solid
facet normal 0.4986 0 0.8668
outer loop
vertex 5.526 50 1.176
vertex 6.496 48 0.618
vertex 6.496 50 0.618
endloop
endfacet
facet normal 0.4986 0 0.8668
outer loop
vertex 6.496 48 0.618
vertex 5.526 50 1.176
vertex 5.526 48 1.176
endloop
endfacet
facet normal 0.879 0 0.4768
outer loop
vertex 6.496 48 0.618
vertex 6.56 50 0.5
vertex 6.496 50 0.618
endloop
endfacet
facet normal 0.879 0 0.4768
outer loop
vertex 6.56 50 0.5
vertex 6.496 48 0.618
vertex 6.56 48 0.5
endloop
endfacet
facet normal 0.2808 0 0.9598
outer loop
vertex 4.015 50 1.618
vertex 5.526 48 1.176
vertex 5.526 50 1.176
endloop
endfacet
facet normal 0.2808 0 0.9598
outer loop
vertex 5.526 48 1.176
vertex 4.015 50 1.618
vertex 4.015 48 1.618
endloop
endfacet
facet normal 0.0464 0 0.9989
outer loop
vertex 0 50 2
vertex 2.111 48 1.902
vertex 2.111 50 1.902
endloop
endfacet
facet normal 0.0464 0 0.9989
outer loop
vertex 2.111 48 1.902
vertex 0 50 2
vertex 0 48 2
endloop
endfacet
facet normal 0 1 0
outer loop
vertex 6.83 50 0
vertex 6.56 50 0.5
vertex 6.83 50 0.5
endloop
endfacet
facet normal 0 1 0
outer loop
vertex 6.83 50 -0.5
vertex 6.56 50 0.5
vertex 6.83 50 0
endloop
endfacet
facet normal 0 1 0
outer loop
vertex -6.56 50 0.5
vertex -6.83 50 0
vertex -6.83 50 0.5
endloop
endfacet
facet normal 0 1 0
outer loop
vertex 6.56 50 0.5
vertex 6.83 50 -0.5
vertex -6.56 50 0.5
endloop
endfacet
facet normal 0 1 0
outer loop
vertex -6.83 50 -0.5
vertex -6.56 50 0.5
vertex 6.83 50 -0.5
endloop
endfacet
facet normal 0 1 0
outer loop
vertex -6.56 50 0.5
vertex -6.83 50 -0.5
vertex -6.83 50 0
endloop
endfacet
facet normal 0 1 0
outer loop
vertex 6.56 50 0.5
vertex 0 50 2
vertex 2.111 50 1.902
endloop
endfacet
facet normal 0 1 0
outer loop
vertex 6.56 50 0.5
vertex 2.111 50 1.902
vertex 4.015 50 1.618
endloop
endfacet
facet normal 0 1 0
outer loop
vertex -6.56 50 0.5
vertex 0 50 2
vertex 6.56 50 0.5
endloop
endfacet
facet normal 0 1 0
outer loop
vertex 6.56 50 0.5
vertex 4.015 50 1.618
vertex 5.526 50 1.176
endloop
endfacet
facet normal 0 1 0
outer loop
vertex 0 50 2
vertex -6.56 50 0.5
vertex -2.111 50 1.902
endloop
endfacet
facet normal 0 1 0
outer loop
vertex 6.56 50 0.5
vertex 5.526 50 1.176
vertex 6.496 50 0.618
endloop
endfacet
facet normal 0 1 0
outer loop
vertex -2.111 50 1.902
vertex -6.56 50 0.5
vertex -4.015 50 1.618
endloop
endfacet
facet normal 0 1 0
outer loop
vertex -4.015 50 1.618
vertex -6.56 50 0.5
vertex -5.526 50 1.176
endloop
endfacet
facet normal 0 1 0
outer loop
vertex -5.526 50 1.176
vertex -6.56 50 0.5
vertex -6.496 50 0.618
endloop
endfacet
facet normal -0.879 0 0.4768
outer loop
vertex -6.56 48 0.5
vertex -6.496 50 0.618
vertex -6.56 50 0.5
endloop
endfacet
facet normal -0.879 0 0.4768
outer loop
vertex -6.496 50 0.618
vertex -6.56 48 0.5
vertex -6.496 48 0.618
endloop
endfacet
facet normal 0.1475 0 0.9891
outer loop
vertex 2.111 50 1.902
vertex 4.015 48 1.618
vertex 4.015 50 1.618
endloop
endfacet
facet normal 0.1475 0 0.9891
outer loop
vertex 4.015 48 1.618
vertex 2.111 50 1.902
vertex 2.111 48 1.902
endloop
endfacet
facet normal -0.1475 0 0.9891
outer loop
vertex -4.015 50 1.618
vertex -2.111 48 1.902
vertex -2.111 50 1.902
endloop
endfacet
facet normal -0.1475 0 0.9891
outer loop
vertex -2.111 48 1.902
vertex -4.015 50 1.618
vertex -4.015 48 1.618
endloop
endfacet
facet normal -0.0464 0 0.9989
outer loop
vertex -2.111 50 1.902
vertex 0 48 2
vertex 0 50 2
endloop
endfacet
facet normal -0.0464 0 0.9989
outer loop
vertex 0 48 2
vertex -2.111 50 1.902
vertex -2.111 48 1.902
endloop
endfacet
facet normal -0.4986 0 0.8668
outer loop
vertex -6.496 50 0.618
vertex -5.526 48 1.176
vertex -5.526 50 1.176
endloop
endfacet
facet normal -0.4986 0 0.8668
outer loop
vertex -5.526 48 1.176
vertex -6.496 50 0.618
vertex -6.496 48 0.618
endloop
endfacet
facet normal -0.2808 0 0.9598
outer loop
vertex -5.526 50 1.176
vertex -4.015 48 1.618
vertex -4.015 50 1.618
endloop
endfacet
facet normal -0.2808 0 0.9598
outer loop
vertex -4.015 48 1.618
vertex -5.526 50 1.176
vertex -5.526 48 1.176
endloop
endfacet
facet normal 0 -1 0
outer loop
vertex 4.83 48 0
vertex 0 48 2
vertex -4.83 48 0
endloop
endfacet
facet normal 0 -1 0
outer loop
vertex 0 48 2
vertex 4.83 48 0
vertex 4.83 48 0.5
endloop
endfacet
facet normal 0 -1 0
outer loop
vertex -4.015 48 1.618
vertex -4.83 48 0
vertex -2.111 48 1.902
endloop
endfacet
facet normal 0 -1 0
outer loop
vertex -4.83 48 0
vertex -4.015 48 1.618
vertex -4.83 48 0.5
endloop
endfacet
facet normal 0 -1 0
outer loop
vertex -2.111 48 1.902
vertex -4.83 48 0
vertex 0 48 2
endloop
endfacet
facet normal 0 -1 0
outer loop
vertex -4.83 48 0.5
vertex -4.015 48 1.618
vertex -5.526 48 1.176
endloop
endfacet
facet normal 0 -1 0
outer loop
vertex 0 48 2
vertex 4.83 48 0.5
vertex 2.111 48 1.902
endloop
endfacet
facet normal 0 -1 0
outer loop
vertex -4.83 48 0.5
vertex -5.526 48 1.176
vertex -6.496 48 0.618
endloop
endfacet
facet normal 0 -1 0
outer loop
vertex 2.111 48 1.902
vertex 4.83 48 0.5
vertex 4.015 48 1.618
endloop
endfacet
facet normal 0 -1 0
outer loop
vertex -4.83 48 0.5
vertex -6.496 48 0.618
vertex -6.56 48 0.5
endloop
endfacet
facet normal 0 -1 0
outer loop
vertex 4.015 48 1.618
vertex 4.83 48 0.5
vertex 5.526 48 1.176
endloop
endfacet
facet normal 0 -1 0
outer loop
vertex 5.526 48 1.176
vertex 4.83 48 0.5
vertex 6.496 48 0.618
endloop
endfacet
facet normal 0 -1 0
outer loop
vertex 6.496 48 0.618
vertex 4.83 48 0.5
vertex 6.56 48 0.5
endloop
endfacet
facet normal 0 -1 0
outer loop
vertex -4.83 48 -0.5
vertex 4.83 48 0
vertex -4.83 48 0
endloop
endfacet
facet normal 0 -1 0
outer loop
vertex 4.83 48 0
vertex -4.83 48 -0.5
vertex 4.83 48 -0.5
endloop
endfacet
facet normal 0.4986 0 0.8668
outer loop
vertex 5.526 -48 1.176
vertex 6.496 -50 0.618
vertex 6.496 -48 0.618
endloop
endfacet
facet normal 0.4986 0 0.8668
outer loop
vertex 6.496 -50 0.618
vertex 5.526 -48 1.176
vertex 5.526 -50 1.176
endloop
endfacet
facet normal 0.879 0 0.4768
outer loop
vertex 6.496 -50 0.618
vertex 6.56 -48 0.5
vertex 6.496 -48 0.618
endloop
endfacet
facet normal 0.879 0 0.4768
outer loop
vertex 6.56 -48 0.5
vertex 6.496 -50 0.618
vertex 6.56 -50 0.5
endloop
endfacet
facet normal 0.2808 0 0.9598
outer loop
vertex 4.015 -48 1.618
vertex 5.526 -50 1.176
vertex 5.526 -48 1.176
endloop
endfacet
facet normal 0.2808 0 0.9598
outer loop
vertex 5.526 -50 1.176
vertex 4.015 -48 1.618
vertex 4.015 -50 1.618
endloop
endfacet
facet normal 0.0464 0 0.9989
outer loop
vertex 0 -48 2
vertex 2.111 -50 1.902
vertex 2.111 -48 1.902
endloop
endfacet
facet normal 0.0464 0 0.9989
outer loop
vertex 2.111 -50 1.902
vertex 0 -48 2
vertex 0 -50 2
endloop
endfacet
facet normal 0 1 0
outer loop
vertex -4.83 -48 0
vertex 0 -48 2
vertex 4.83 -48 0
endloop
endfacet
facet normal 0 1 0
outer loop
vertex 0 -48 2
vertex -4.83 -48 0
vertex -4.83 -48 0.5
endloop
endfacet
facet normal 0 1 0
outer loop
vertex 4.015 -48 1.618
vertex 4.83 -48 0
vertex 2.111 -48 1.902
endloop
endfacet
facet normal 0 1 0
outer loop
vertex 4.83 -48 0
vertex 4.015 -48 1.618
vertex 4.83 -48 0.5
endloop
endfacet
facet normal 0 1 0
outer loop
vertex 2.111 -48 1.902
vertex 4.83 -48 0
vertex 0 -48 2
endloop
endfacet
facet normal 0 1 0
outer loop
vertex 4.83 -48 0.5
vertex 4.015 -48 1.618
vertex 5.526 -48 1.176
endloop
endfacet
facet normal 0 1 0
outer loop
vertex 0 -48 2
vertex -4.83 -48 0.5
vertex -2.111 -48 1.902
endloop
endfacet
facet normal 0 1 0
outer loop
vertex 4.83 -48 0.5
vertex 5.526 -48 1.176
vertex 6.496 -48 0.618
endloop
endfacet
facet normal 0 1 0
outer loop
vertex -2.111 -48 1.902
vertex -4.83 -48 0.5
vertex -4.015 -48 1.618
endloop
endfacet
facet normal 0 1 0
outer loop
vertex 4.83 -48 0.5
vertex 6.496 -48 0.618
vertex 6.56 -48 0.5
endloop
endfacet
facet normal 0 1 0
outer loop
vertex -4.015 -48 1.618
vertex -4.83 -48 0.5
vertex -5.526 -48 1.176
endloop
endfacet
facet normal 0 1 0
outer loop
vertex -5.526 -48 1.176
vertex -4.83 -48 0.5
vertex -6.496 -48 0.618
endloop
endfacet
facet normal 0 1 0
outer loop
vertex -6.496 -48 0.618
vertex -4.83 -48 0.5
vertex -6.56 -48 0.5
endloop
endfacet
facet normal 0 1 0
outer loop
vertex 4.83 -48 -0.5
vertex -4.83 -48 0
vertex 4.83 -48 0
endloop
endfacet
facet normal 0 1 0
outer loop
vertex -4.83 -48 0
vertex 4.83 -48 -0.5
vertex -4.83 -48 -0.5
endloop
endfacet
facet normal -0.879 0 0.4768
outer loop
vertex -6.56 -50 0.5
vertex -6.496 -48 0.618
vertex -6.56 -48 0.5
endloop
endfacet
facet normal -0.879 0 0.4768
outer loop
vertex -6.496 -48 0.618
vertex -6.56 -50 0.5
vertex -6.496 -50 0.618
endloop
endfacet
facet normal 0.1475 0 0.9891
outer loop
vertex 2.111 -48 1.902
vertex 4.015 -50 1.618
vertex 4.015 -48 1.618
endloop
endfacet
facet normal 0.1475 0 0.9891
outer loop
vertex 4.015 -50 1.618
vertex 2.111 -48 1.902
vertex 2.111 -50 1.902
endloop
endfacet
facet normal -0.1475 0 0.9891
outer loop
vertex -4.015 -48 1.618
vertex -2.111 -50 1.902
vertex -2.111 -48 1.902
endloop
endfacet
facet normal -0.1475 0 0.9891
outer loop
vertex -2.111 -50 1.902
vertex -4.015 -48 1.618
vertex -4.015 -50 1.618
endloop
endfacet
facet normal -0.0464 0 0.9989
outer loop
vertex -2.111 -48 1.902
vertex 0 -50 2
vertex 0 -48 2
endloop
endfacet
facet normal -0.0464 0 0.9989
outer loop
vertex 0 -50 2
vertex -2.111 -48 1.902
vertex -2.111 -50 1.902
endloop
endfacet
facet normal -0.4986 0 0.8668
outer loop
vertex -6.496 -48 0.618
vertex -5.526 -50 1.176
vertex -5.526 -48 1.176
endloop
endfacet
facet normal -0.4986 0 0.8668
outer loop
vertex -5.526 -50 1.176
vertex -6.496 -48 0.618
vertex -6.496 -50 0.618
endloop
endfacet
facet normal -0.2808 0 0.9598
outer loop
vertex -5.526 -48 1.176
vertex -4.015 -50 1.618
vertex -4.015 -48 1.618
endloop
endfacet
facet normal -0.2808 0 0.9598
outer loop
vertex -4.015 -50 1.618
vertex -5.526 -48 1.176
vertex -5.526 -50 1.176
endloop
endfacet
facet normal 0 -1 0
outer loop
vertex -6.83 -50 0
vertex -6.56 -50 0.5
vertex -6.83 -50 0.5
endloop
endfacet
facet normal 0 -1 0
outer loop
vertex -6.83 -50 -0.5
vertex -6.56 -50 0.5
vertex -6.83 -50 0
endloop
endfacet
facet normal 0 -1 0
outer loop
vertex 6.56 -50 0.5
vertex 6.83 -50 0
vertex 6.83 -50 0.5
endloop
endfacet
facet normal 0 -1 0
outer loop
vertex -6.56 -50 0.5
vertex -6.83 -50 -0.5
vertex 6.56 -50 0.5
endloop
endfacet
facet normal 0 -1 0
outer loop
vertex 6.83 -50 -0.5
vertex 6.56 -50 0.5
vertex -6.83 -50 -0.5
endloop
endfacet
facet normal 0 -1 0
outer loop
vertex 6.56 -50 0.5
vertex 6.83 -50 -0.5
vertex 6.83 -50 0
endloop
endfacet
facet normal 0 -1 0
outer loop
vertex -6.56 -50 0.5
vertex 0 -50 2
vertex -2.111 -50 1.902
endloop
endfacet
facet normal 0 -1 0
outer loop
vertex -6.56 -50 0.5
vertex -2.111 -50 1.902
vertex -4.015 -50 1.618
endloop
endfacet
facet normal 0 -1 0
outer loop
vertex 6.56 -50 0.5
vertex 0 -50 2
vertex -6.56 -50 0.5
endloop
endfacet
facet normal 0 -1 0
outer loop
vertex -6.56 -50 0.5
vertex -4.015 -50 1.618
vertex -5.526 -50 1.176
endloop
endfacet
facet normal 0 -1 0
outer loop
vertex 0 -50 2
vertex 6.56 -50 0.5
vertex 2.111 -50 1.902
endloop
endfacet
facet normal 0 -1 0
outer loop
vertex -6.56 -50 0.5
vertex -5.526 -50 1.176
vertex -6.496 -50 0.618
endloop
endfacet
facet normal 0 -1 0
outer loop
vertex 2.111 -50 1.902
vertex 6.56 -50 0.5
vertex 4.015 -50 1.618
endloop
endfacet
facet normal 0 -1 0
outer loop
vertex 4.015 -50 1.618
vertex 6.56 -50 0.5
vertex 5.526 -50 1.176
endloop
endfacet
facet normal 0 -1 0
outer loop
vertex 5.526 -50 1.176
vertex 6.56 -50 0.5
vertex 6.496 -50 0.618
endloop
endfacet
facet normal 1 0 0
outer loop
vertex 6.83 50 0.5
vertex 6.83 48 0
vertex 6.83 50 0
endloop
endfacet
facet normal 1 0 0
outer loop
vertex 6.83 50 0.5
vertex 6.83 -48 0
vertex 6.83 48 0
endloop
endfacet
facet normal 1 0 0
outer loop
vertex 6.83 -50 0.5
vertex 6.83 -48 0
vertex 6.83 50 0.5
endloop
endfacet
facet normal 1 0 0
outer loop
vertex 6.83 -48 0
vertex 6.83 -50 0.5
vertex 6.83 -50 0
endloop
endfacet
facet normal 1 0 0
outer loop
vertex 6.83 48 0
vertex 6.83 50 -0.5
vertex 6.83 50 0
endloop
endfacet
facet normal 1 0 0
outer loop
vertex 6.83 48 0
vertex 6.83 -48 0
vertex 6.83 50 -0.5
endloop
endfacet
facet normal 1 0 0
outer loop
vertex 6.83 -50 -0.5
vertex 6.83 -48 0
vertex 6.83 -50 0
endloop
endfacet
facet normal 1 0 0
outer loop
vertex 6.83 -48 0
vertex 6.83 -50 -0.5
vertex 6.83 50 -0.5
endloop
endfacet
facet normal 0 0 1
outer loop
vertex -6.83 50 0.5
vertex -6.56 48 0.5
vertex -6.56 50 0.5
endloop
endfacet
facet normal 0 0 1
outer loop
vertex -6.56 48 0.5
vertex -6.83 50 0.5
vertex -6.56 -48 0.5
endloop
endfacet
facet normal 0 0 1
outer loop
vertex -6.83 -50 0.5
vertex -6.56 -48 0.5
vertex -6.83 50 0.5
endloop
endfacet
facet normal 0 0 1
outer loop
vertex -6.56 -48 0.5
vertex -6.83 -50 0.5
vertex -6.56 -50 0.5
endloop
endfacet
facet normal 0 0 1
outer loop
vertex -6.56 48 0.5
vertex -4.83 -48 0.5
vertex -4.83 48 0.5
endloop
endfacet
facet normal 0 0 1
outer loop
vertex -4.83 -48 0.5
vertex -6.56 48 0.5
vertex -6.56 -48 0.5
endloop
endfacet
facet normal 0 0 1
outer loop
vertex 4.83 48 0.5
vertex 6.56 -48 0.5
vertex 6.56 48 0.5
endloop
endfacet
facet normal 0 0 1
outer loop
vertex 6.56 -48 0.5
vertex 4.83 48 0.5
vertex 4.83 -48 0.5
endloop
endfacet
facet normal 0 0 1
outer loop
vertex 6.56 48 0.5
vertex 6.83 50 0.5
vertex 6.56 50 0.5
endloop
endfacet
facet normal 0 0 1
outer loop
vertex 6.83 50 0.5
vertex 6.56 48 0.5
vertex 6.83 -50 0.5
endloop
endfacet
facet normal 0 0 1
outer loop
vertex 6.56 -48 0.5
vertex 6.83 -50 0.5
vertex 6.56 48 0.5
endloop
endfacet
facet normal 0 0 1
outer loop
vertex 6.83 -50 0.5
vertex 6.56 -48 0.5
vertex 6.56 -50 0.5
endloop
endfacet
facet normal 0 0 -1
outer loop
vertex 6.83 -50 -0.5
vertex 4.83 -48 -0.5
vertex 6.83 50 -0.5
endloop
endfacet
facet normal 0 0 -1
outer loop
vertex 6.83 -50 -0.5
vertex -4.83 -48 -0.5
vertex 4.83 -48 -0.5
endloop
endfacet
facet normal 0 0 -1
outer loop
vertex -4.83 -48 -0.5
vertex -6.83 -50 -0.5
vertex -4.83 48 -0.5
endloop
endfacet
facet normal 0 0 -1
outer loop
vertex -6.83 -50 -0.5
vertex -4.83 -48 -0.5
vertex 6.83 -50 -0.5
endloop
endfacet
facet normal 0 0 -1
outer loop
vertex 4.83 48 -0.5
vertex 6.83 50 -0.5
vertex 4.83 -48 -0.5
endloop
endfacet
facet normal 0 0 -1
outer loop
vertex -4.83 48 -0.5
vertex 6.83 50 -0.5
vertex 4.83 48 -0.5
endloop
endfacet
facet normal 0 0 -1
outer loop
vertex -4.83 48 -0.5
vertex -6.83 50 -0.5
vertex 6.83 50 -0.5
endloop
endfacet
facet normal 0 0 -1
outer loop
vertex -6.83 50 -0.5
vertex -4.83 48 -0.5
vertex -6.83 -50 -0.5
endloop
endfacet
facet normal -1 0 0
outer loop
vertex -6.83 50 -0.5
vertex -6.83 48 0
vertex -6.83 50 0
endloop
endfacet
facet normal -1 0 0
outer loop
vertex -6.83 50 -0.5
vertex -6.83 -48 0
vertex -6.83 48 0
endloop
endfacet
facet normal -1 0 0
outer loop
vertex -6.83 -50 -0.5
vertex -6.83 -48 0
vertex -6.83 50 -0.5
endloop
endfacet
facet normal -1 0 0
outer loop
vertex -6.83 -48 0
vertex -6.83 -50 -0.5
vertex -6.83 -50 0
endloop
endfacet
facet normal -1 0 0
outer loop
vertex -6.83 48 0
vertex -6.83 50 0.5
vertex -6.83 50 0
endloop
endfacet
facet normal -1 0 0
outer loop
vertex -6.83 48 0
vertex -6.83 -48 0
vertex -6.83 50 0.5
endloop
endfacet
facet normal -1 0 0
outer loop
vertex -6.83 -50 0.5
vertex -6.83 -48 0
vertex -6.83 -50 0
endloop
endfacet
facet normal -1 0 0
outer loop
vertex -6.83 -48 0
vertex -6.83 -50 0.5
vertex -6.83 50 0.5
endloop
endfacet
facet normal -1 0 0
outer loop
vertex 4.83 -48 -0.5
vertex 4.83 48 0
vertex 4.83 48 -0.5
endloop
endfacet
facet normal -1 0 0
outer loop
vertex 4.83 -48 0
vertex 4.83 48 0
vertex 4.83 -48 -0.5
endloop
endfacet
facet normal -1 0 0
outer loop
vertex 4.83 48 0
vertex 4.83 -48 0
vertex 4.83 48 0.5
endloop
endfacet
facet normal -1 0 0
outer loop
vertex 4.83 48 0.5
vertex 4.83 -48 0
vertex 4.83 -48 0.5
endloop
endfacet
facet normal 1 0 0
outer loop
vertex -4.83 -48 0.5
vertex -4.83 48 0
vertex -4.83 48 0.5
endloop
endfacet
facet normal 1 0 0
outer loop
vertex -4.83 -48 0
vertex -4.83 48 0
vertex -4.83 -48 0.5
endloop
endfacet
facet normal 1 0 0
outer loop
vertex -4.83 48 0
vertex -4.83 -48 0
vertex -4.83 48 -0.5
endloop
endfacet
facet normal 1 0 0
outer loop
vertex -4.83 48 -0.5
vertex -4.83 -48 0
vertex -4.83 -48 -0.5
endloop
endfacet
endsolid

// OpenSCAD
// Length of LED Section 
length=100; // [5:200]

width=13.66+0.00;
$fn=20+0;

translate([0, length/2-1, 0]) { endarch(); }
translate([0, 0-(length/2-1), 0]) { endarch(); }
difference() {
    cube([width, length, 1], center=true);
    cube([width-4, length-4, 2], center=true);
}

module endarch() {
    rotate([90,0,0]) {
            resize(newsize=[width, 2, 2]) {
            difference() {
                cylinder(h=1, r=5, center=true);
                translate([0, -25,0]) cube(50, center=true);
            }
        }
    }
}
